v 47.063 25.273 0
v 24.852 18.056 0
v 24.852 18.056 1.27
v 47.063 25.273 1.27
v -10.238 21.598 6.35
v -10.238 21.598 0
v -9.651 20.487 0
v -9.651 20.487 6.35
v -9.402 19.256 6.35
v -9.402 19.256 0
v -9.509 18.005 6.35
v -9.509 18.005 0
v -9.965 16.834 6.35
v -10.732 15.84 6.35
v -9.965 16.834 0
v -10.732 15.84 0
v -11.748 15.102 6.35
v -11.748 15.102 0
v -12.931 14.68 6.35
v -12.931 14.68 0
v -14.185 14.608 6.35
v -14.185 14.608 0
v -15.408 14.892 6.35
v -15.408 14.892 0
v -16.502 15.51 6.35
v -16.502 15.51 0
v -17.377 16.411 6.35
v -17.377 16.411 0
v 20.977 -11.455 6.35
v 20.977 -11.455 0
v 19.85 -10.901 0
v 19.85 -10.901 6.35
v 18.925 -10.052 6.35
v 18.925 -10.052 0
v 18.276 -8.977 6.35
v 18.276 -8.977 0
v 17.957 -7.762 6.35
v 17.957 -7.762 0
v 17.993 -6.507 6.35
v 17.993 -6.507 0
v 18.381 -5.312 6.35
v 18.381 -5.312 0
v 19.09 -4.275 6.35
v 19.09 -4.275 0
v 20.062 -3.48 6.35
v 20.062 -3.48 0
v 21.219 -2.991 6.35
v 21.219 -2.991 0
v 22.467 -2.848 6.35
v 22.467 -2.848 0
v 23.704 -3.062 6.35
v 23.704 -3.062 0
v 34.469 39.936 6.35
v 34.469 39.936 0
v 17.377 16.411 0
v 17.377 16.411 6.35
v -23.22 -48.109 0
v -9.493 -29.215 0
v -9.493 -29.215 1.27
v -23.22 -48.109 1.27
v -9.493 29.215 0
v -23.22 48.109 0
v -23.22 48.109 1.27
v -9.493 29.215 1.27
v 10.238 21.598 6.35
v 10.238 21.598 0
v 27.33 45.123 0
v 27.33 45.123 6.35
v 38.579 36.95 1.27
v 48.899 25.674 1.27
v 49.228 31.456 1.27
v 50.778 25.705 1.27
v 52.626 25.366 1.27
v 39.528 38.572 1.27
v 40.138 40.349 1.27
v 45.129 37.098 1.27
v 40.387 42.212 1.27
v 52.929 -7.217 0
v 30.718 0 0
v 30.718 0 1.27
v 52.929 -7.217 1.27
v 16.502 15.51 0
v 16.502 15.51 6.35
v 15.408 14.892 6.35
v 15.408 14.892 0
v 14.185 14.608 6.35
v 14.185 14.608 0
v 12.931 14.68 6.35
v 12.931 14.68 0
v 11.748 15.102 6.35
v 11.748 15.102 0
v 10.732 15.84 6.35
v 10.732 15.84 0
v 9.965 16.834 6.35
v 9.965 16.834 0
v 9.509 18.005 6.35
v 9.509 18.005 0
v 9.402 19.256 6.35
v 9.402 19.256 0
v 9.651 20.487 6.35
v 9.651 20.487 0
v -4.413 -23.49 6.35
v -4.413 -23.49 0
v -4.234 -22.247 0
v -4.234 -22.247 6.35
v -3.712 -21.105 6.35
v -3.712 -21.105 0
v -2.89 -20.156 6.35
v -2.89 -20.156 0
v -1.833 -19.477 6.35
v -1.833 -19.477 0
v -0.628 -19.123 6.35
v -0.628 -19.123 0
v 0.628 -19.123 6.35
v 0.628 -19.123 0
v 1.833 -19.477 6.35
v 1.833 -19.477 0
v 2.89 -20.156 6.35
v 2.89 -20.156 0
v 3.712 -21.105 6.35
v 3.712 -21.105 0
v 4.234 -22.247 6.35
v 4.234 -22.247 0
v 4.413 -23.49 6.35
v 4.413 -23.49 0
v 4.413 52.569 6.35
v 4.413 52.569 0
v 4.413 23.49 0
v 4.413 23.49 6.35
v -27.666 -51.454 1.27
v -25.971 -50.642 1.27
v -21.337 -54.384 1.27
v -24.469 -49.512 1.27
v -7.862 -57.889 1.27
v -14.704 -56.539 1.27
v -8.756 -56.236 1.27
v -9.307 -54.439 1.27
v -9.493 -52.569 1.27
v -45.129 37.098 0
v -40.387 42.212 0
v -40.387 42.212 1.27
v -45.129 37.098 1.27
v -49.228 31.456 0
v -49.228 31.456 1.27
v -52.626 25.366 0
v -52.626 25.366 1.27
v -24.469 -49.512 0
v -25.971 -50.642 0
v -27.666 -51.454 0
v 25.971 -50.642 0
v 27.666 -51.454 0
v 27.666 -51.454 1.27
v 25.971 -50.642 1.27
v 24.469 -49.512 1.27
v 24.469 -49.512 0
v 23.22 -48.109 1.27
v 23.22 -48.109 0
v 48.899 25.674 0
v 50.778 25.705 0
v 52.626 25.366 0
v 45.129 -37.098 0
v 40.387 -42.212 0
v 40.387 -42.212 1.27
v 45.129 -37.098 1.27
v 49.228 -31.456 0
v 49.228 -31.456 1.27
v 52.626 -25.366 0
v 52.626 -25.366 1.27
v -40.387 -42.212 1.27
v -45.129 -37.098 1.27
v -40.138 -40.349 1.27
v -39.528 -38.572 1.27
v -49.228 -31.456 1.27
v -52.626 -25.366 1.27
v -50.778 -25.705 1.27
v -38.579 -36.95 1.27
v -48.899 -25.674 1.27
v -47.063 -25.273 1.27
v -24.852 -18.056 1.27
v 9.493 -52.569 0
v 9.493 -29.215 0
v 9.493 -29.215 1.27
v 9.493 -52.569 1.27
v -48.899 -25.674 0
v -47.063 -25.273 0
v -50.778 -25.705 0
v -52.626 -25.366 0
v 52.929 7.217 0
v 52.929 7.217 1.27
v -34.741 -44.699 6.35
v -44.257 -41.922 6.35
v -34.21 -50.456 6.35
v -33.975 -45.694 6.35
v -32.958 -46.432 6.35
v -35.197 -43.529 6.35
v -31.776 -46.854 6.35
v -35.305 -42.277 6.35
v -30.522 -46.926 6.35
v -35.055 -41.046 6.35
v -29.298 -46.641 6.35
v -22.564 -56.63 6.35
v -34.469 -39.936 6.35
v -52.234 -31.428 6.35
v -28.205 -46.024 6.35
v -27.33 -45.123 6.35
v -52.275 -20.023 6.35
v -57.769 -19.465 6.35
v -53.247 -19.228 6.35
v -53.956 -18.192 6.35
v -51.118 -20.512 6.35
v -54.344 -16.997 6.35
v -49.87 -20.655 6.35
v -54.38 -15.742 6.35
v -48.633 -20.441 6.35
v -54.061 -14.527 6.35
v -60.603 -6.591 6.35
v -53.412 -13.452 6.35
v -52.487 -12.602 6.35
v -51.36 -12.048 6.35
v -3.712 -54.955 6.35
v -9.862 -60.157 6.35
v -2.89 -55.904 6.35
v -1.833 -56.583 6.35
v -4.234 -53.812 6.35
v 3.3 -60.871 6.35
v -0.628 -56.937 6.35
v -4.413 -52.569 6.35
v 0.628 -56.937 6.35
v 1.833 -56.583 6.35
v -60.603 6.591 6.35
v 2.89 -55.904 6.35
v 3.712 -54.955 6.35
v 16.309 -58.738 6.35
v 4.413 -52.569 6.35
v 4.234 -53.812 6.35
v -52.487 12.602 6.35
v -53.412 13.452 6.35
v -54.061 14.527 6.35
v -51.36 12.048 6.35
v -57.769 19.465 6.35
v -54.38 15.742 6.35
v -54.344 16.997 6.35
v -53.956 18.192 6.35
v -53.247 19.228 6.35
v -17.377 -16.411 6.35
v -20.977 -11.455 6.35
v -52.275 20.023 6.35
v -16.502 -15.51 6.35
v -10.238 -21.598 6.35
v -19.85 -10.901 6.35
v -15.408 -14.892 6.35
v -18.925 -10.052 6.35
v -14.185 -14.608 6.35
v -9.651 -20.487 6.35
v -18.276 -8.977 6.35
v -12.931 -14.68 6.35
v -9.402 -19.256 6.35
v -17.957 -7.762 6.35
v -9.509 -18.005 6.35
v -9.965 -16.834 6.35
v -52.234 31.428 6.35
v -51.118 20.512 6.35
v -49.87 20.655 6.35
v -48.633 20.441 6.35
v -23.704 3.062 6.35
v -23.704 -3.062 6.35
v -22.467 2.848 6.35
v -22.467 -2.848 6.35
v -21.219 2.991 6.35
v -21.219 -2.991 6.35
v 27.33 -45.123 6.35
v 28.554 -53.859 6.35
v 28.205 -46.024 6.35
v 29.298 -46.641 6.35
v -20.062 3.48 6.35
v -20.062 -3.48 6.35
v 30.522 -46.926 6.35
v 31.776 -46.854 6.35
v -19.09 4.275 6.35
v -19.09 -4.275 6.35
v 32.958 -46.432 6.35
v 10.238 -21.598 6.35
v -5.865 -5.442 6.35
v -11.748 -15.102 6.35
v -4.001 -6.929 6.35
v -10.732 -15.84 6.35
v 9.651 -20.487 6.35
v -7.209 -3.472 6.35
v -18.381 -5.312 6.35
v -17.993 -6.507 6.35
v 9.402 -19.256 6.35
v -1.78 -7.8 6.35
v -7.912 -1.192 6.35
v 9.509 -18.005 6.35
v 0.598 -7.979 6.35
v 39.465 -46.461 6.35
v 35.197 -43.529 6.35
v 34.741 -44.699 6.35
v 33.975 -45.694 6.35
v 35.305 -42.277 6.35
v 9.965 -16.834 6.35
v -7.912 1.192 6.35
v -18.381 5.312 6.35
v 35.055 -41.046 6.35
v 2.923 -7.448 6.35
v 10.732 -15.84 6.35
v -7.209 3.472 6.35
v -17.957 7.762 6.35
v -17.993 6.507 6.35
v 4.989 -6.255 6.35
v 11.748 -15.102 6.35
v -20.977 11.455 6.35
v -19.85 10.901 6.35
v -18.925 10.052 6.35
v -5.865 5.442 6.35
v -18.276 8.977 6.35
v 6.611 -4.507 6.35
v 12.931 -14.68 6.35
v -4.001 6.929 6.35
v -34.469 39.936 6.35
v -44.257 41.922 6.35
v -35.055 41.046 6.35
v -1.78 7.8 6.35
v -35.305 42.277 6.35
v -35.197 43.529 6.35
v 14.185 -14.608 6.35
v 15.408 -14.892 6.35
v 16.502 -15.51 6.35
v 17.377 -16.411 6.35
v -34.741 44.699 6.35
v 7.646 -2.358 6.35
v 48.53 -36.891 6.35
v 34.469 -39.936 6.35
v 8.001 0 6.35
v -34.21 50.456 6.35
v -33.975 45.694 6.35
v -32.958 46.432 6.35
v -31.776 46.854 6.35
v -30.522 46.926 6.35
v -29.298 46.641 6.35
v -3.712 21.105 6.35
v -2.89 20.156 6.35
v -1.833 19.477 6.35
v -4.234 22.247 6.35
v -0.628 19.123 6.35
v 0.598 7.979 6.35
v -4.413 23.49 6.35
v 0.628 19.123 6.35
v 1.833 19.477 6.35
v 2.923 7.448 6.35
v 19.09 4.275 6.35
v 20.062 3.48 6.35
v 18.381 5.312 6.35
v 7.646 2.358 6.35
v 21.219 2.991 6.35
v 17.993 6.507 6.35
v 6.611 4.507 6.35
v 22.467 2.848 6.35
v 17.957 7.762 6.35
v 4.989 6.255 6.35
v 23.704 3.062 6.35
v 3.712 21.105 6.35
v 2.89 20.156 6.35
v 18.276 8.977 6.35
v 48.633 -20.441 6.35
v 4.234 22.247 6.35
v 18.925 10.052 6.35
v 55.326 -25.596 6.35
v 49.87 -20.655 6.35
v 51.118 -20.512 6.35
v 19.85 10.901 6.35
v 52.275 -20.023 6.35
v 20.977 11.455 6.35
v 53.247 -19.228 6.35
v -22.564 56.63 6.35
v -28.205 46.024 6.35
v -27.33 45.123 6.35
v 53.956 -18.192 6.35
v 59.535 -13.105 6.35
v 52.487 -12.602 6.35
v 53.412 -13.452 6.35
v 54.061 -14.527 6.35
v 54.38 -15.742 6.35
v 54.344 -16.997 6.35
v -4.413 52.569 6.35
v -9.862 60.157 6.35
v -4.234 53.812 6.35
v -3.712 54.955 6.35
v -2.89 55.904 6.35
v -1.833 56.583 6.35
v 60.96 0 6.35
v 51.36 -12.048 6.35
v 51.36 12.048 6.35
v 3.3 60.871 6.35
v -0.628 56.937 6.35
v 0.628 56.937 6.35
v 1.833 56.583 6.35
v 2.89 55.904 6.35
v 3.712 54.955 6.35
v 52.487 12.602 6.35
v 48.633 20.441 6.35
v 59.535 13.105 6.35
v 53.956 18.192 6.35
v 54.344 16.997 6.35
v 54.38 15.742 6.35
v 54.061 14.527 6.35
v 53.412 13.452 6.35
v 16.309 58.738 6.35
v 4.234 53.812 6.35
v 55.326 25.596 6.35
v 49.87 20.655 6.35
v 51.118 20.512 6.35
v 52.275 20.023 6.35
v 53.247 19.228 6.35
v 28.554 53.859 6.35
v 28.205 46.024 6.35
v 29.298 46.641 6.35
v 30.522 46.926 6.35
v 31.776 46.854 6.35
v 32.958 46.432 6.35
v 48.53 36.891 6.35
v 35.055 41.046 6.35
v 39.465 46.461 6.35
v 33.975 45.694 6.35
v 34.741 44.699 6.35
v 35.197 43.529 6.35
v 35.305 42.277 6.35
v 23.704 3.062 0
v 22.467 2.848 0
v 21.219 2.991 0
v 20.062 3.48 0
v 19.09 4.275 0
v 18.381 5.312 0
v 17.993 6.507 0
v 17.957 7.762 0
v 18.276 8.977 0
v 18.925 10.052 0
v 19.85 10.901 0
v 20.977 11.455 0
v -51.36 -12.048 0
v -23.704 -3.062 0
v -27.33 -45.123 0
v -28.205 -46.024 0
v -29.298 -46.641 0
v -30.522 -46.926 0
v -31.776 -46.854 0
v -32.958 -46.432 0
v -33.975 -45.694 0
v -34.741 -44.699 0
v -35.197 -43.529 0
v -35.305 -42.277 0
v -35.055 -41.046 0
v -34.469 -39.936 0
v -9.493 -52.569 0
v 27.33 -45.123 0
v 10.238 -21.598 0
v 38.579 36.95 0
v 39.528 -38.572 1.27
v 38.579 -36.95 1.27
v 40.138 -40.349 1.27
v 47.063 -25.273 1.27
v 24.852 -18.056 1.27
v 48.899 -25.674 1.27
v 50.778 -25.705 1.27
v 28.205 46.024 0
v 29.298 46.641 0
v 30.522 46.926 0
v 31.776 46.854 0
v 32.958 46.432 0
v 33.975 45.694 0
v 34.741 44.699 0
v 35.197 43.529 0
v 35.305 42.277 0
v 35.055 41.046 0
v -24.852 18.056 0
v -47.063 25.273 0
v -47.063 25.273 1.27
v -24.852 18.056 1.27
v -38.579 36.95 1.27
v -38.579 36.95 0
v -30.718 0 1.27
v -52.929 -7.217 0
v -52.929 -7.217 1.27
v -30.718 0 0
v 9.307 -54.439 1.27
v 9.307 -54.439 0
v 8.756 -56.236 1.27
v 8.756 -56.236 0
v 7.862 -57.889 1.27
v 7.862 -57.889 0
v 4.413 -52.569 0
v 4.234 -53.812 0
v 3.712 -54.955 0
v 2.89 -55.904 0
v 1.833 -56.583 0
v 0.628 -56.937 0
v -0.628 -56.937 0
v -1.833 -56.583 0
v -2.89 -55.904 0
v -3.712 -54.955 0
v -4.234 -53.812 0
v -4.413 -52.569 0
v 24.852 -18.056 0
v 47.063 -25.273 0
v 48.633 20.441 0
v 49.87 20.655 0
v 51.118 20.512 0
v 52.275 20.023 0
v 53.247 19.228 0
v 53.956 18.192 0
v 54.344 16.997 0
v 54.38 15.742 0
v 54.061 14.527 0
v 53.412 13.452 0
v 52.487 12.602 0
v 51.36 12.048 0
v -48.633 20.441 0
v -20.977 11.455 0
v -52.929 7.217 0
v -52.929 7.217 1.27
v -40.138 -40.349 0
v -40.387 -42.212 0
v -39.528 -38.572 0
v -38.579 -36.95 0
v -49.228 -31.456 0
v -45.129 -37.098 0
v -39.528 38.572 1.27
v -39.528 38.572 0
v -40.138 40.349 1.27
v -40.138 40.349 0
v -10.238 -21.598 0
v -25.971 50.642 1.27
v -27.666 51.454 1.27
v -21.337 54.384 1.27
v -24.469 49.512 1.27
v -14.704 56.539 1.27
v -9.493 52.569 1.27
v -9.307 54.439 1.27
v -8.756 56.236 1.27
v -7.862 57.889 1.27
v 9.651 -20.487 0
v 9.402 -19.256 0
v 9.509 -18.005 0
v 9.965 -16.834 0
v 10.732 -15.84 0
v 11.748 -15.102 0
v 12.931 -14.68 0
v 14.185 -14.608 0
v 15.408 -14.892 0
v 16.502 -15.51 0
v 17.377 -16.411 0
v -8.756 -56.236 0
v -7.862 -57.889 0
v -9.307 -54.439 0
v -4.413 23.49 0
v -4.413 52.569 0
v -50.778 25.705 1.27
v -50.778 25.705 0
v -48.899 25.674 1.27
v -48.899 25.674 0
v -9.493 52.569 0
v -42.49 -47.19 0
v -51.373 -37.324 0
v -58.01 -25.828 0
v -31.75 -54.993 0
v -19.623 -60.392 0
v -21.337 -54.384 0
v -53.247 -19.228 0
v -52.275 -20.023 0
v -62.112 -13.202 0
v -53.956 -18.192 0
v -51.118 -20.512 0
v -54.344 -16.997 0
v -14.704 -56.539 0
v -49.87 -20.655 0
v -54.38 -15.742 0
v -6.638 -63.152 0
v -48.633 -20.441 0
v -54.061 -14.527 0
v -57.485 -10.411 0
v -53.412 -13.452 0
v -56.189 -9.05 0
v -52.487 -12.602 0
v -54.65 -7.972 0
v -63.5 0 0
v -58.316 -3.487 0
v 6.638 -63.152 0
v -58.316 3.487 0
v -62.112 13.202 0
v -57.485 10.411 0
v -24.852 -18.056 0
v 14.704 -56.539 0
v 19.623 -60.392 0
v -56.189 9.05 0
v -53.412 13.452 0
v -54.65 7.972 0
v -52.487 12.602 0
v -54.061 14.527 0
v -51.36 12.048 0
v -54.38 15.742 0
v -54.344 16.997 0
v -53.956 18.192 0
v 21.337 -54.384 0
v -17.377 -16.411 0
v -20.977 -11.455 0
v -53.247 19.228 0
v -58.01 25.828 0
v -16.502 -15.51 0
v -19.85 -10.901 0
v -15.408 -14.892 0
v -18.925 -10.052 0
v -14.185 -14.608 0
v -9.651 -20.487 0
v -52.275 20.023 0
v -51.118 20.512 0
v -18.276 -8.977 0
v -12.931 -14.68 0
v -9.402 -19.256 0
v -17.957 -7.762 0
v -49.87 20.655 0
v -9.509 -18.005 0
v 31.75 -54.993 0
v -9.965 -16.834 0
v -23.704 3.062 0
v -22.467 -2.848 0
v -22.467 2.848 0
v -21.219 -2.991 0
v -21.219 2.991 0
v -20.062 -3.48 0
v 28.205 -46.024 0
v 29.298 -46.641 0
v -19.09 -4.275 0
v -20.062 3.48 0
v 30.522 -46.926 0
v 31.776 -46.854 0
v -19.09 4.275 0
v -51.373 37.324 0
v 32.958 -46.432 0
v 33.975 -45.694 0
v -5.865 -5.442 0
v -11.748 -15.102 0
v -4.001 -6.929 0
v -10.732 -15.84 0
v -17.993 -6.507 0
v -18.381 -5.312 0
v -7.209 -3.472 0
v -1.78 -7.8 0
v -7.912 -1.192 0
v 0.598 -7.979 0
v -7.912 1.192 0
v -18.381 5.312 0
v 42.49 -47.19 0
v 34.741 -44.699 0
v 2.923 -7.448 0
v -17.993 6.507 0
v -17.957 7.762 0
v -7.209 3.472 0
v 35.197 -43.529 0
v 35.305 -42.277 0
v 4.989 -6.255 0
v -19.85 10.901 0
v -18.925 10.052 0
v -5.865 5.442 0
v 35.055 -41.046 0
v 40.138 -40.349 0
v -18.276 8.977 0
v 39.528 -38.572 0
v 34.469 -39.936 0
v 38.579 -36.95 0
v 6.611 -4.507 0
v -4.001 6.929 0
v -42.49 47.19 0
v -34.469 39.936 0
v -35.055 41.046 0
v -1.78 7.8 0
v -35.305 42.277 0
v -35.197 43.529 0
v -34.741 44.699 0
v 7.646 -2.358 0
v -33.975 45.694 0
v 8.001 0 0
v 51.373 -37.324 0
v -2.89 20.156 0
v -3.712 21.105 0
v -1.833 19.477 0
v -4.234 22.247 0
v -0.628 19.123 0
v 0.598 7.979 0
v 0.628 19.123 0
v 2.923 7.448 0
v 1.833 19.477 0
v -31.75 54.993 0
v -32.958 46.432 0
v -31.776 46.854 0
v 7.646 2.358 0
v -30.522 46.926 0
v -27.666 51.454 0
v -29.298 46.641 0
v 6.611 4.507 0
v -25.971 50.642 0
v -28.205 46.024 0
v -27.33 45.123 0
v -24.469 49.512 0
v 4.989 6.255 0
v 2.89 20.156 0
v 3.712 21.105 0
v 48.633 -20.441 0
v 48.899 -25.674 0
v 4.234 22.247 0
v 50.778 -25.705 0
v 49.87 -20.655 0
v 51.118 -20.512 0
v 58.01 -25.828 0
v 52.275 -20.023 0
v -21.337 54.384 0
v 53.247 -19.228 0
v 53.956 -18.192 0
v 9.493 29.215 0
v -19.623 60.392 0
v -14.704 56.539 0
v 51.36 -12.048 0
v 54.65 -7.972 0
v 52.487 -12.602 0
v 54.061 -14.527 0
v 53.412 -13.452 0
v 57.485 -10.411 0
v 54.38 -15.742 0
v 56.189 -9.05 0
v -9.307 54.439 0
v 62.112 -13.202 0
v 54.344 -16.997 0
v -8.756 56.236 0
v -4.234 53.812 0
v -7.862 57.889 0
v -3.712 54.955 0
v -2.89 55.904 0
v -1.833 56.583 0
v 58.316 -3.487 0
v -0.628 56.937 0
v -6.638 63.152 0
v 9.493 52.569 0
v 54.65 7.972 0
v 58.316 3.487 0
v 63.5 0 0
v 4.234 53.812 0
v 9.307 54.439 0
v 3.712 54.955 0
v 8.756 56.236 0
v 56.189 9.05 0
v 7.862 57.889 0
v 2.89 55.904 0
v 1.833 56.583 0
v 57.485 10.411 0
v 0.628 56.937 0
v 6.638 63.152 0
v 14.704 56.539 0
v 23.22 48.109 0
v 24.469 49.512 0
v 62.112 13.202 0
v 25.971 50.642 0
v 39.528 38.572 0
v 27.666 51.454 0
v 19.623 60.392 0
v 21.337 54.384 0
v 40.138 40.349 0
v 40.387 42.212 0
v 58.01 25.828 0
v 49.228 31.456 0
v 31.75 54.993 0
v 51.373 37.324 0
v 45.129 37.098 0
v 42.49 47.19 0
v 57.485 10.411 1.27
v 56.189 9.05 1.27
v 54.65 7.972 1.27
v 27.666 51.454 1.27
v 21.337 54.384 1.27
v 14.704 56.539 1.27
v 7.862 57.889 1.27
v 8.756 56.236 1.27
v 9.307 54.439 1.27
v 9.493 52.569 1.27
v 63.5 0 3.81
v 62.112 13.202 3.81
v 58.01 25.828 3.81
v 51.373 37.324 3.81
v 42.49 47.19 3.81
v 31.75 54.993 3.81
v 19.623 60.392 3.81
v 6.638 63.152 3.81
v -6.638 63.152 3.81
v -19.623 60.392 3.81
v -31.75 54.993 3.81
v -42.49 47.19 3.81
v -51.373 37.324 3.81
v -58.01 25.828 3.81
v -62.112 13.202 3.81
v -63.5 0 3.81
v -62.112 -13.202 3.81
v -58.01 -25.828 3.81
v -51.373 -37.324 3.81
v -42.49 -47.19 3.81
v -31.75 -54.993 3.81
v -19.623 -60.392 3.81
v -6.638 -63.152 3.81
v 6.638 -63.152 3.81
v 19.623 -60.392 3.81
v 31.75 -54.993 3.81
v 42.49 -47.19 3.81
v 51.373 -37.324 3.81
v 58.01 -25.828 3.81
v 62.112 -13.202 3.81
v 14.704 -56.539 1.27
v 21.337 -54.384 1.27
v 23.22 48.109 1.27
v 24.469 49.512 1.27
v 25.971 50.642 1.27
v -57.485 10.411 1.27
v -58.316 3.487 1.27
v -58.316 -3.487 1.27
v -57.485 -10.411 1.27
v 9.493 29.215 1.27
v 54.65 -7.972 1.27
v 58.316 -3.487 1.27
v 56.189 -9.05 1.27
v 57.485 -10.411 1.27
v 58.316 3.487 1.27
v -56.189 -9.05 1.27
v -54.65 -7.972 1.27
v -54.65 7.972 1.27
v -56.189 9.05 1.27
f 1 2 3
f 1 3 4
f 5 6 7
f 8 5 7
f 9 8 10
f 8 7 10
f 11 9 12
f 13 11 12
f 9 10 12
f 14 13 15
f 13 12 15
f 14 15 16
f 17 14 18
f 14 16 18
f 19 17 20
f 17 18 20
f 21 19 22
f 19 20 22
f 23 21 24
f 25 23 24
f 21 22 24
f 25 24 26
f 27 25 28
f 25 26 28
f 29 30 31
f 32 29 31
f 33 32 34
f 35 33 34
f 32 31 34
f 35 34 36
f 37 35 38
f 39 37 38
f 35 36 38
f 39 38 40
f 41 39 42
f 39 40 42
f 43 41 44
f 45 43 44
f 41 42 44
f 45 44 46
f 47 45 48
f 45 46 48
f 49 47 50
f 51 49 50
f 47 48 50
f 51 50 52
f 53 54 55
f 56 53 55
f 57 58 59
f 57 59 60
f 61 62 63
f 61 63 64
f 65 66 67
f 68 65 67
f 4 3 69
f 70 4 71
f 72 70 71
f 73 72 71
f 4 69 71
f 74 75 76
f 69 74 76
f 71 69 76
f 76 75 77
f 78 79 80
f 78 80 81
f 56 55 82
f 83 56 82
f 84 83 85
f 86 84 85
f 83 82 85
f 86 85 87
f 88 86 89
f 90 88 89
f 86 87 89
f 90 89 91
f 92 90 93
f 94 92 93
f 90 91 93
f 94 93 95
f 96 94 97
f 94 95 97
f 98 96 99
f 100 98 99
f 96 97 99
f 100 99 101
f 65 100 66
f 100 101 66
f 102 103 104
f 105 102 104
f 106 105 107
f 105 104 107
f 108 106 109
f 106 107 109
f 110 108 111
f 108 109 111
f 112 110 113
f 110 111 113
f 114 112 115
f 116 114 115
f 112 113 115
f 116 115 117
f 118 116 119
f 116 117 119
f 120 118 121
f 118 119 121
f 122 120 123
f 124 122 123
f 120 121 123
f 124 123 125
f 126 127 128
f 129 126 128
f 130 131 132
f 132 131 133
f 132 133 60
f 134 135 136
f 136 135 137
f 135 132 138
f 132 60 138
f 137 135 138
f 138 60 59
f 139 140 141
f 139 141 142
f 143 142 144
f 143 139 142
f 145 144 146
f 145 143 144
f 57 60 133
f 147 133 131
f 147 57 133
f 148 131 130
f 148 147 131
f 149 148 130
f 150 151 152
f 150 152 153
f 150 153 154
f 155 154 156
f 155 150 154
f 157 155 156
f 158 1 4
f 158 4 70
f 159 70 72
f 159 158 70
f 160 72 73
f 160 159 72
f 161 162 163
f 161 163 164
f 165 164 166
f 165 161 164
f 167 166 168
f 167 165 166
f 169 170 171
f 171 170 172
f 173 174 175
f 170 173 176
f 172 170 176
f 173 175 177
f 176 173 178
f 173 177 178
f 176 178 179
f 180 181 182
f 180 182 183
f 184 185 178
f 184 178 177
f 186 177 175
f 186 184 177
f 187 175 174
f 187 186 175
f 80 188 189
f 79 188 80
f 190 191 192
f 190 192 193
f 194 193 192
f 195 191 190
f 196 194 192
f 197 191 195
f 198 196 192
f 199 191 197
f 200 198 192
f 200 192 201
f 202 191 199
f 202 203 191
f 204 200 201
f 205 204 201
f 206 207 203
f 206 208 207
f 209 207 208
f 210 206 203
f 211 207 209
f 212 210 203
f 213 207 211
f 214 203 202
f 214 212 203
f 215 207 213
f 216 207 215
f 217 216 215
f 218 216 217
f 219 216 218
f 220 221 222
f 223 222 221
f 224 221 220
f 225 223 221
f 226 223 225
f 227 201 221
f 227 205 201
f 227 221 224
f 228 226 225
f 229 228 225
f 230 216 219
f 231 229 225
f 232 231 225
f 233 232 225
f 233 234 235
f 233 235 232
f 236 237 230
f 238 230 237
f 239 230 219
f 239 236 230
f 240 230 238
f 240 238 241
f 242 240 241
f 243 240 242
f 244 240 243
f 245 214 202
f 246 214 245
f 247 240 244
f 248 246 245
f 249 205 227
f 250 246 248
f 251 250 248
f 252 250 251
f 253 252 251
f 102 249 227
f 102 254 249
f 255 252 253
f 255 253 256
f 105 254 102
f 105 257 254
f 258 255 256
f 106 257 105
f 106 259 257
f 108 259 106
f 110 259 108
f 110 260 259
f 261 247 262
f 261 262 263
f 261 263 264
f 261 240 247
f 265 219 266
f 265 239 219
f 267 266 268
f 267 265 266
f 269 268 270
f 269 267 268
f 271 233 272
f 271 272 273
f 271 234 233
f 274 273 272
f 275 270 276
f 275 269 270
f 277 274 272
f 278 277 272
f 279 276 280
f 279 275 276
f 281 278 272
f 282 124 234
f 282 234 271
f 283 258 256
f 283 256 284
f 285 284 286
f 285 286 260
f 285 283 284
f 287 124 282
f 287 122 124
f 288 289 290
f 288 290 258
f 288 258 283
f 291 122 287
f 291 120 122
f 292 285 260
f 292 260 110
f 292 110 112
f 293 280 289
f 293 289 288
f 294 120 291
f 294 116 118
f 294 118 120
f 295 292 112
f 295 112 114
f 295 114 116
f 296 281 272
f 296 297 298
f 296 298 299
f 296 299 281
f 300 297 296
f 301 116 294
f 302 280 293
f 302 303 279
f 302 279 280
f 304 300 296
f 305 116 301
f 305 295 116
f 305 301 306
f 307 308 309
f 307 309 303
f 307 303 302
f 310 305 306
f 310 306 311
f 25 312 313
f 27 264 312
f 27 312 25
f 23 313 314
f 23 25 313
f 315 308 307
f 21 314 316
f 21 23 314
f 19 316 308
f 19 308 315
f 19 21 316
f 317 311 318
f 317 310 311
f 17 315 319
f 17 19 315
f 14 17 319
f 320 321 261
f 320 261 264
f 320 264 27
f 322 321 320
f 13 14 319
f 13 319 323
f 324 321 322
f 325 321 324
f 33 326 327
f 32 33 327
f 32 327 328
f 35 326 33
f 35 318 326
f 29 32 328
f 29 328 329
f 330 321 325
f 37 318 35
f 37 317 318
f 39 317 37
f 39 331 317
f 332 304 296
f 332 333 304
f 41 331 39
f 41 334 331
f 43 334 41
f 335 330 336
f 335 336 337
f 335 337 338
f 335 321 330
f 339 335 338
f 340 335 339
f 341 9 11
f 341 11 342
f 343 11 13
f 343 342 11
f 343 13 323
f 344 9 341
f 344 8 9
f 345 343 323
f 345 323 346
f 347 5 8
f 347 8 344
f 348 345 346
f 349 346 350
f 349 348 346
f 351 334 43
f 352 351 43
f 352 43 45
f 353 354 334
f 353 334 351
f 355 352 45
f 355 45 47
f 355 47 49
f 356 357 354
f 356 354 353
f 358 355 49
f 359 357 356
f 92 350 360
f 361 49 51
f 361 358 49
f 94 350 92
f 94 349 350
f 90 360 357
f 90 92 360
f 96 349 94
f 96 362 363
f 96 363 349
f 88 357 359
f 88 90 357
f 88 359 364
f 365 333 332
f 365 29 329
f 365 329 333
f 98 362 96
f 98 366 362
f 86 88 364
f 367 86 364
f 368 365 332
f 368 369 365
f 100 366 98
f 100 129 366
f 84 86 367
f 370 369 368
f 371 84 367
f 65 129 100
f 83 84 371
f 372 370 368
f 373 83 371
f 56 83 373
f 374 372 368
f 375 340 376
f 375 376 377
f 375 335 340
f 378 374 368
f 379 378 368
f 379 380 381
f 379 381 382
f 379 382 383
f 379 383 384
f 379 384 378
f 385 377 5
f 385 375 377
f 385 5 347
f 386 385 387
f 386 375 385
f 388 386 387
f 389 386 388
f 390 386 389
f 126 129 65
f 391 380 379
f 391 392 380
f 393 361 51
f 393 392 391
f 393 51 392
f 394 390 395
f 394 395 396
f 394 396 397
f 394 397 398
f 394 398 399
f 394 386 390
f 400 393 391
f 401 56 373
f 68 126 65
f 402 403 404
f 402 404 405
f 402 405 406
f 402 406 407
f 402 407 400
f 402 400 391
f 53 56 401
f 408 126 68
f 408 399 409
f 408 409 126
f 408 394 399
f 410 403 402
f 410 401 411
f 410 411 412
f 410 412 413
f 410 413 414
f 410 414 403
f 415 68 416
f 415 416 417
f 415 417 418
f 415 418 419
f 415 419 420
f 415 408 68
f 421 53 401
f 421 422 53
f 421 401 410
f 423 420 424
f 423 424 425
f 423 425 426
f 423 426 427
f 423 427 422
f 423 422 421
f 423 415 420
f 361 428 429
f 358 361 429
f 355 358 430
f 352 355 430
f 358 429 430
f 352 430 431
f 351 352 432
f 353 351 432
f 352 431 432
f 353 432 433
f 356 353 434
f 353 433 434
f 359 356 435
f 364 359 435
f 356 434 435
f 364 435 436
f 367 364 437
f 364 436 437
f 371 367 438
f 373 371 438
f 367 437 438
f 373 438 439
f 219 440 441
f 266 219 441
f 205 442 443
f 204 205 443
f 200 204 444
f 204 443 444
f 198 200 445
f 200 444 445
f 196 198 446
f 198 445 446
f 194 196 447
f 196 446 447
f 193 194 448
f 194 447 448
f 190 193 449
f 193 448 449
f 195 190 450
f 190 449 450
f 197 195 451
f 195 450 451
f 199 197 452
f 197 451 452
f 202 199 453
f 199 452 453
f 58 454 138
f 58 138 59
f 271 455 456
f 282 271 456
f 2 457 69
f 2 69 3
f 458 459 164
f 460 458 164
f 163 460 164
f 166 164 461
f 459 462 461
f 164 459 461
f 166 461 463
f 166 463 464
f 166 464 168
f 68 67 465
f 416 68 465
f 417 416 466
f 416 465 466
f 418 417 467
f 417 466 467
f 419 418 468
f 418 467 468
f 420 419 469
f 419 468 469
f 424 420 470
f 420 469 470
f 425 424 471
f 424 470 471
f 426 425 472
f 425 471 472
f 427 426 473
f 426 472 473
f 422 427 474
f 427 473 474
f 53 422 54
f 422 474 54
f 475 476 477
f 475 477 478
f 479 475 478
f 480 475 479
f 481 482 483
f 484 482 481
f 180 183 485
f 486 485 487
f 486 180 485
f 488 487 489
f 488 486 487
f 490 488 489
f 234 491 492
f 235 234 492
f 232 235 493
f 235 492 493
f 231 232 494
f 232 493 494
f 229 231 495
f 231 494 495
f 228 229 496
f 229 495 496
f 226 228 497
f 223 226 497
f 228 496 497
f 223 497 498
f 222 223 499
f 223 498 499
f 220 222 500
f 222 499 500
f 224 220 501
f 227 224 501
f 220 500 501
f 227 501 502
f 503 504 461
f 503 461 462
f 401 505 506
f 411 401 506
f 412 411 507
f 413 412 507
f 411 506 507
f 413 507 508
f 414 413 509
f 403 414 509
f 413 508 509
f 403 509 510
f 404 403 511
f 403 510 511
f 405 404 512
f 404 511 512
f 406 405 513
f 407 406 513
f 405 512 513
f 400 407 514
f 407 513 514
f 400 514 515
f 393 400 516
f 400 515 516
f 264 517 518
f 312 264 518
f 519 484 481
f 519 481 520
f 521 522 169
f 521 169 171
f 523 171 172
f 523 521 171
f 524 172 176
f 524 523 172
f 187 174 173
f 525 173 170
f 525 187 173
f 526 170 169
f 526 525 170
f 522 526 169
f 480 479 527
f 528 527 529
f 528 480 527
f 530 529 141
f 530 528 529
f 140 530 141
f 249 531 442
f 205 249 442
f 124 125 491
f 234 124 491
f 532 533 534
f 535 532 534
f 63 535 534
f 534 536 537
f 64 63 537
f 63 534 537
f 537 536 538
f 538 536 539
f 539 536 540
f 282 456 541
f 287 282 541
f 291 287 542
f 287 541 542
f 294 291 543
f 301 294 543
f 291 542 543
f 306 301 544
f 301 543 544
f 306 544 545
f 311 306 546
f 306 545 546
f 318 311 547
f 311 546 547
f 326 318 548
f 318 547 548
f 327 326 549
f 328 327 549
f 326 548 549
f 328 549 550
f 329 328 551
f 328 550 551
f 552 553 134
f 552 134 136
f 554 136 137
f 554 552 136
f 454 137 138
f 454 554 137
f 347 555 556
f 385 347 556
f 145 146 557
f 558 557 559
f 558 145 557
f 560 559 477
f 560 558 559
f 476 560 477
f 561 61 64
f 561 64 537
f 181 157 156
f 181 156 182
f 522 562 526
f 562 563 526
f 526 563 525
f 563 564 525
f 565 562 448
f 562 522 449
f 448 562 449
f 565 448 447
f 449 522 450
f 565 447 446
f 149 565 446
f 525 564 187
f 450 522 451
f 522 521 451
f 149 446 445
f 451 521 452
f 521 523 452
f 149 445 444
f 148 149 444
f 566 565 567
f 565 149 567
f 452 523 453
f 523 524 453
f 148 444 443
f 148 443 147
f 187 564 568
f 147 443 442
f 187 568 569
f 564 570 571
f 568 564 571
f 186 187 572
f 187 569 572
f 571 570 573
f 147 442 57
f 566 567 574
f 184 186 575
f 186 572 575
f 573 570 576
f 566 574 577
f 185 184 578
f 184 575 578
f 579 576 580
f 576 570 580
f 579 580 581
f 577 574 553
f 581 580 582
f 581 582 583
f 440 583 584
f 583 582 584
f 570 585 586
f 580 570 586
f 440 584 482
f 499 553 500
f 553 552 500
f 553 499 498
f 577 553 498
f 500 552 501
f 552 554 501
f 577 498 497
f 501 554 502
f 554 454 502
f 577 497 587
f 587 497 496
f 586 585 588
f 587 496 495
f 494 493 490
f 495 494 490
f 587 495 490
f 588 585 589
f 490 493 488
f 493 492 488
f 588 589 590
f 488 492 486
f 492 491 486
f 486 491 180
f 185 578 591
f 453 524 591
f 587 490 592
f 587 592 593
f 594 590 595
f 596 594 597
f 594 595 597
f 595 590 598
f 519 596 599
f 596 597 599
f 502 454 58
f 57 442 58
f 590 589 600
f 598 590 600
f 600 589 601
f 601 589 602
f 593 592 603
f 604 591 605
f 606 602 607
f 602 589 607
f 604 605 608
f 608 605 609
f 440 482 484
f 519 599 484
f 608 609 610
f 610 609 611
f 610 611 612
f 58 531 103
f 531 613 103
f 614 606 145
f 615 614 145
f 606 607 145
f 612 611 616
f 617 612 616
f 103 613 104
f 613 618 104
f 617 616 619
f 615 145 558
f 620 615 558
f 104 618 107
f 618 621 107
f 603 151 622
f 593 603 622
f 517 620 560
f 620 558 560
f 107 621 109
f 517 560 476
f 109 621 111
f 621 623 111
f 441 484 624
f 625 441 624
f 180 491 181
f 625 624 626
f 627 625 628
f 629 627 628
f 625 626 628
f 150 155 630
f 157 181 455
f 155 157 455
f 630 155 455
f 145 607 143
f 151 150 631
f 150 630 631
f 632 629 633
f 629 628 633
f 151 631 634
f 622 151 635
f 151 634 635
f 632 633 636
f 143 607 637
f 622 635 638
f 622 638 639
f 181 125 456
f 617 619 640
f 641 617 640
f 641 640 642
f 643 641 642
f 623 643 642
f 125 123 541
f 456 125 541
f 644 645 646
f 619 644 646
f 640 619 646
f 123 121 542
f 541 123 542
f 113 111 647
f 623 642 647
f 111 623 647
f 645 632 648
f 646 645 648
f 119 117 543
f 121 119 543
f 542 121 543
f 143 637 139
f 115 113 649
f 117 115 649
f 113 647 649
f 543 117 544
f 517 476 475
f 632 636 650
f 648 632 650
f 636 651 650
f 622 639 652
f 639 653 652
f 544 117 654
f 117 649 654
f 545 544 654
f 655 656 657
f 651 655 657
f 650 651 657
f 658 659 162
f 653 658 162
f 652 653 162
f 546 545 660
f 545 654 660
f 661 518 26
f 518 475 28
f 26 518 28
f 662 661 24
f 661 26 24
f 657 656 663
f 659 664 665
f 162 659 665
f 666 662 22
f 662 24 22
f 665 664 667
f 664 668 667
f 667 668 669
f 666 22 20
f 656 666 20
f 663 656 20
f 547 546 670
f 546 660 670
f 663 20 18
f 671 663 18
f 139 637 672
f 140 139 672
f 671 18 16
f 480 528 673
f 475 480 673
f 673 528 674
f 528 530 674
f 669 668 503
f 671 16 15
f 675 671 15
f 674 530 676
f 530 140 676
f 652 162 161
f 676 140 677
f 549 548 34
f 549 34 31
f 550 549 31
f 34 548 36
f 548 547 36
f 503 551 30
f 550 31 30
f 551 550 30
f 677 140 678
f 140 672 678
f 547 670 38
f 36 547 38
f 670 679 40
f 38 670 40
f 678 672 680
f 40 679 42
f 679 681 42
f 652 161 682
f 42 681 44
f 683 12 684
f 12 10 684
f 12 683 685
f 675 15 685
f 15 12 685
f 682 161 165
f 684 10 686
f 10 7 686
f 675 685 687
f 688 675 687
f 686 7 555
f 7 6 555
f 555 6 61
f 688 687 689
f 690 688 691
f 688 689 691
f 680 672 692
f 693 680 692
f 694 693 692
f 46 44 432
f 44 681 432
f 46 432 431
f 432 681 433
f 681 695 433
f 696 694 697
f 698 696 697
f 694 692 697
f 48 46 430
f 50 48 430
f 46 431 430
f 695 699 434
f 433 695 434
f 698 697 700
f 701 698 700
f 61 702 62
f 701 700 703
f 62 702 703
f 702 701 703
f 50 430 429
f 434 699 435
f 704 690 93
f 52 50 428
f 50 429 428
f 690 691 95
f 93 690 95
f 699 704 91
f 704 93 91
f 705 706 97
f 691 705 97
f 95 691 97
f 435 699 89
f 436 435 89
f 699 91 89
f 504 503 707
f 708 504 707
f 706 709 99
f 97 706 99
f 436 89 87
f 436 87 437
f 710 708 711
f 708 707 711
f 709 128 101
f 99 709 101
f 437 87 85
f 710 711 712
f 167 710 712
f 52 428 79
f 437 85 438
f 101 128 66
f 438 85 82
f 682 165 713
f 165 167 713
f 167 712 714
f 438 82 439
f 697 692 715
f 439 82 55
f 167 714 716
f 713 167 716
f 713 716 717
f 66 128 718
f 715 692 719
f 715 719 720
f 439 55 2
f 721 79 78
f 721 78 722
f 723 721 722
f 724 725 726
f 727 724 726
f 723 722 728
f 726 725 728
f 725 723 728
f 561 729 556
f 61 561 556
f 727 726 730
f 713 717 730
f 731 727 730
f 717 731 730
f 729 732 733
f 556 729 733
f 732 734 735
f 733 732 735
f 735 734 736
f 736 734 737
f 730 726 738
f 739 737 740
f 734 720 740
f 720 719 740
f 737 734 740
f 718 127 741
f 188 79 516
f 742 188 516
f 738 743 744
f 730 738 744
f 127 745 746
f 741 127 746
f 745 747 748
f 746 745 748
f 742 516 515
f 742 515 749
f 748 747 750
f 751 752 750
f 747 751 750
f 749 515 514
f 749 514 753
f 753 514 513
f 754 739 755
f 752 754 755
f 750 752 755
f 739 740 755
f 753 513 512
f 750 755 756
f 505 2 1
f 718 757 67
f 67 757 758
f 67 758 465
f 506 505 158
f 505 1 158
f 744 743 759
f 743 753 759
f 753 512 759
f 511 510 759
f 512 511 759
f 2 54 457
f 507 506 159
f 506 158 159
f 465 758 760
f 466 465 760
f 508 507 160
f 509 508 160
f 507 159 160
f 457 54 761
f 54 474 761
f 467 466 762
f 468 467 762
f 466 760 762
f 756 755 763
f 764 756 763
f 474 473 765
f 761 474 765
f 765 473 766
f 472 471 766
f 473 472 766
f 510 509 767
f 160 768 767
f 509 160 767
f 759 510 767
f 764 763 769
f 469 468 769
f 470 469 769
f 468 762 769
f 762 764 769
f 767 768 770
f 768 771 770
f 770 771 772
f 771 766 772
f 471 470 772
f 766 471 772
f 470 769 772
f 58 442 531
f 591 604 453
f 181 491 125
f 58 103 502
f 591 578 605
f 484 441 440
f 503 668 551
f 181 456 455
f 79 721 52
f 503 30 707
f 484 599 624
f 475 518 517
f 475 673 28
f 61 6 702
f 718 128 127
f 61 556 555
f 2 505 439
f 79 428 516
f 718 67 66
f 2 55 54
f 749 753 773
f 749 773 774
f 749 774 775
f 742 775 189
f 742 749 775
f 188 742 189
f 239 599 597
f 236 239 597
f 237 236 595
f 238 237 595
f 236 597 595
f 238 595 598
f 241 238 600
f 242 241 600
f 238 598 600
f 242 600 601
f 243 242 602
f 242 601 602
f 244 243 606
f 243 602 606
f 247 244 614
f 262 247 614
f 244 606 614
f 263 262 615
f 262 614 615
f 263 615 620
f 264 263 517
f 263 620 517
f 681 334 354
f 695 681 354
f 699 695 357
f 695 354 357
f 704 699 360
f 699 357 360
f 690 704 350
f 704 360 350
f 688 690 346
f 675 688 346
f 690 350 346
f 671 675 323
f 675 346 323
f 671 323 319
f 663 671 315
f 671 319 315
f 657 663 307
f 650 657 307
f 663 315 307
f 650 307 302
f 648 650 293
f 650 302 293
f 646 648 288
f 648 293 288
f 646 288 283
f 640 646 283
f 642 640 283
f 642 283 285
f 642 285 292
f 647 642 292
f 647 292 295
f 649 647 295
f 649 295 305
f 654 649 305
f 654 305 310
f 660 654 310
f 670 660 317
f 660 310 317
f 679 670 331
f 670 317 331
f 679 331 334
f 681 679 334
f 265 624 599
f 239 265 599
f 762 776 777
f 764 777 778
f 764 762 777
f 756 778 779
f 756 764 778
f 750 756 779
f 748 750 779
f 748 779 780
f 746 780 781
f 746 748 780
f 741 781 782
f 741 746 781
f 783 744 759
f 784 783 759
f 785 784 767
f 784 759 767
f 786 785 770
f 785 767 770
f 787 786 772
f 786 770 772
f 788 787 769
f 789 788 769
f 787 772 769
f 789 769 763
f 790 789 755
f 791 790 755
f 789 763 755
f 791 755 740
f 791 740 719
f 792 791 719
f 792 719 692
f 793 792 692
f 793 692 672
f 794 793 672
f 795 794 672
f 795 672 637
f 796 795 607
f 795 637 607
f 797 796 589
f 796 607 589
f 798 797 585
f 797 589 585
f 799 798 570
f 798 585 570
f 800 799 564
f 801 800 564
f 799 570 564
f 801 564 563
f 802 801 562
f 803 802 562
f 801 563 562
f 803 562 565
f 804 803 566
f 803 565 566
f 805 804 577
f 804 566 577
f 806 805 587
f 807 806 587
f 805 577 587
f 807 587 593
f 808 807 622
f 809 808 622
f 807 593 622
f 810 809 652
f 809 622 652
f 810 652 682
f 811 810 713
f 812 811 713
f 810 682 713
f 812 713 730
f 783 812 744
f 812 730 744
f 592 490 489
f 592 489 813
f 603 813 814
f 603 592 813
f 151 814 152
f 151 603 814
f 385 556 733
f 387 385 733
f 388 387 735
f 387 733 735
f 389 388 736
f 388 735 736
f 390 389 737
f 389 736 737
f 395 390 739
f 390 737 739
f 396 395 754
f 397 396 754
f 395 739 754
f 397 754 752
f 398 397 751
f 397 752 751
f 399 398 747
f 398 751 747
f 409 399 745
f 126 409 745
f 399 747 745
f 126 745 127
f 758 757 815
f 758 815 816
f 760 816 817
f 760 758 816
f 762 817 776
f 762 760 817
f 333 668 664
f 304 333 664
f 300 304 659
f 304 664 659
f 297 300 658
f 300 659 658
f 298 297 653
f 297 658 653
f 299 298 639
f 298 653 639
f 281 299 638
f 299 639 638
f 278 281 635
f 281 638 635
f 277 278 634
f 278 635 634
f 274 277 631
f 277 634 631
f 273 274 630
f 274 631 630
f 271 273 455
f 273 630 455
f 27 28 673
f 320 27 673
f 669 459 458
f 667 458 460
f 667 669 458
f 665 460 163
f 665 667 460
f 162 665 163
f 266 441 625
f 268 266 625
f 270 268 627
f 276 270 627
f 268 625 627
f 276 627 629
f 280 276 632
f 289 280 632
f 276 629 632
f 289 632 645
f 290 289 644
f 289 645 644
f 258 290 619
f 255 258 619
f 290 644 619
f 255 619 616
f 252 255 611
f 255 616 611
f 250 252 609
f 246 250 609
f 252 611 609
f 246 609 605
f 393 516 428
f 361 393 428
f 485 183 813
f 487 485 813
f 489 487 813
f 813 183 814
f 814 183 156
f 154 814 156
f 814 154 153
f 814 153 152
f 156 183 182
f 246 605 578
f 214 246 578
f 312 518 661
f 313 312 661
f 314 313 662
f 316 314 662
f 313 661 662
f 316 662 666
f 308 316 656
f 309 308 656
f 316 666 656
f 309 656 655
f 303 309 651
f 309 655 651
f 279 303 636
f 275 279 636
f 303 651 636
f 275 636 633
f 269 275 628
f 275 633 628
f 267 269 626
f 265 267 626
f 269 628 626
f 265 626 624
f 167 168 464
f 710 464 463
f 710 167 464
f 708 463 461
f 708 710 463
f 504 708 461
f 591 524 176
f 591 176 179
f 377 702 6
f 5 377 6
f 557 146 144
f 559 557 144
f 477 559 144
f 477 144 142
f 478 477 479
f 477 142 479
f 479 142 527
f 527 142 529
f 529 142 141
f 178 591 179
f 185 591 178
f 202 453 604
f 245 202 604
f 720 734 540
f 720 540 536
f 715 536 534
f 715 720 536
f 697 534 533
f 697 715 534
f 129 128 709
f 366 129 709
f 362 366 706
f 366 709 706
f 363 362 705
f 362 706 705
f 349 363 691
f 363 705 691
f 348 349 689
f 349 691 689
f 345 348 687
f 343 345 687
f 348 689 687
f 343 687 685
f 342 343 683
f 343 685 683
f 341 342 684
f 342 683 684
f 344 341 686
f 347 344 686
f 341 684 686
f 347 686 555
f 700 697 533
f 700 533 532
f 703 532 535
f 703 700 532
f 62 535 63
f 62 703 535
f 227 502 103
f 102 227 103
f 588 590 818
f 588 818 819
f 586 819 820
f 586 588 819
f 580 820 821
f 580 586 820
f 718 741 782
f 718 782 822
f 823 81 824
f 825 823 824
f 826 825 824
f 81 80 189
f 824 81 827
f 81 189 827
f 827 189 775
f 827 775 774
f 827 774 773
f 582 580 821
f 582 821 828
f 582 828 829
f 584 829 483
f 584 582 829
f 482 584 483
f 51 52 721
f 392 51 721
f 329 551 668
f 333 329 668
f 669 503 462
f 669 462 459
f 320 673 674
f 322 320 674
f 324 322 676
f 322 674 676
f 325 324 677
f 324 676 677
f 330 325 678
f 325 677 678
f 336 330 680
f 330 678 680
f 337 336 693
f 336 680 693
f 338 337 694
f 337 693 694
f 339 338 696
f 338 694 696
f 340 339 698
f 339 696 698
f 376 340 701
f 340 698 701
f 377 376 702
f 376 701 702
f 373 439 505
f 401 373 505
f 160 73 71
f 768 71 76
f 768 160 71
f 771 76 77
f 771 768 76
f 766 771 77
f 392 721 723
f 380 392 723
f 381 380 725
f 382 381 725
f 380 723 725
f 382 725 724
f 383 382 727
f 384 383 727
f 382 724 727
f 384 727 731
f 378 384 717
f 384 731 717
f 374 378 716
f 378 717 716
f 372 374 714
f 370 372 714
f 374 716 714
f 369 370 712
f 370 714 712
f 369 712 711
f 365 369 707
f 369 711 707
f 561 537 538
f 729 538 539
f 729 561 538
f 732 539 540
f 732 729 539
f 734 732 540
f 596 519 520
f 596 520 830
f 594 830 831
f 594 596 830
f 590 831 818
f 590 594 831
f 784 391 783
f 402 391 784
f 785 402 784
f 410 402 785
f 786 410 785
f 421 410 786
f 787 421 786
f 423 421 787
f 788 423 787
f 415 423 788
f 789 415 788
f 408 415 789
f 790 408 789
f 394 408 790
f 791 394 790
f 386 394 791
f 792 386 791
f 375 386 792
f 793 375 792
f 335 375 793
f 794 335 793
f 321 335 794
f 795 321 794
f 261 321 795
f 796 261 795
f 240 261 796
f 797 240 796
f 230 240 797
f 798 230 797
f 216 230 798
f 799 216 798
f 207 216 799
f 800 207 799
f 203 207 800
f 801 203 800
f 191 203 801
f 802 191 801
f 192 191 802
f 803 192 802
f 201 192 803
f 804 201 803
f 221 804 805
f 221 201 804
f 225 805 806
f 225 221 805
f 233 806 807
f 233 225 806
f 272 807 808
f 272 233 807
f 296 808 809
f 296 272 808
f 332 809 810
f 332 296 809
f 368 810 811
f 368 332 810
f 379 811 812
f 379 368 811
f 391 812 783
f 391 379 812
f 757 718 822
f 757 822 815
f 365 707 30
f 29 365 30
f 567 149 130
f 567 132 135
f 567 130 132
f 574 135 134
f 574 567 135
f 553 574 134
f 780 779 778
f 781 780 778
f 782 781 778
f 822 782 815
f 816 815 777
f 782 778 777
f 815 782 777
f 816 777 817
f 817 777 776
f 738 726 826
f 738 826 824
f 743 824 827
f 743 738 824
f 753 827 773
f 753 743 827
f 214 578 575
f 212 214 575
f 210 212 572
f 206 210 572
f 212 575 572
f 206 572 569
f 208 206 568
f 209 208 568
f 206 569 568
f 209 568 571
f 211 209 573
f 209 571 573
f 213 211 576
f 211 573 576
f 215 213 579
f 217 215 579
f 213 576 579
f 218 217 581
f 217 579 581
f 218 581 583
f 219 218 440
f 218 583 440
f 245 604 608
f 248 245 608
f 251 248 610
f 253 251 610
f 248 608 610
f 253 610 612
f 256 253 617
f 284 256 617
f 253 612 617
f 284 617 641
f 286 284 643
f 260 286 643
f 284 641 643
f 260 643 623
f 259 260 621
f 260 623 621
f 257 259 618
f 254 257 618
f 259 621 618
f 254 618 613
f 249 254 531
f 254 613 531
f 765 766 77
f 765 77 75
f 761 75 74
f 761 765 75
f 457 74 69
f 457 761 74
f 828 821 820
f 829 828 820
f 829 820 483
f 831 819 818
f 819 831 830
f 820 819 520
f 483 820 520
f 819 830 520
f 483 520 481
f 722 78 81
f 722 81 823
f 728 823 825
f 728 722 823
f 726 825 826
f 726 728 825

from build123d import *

# Parameters (mm, degrees)
F0_R     = 63.5
F0_R_2   = 12.7
F1_DEPTH = 6.35
F2_T     = 5.08
F3_SIZE  = 2.54
F4_R     = 12.7
F4_R_2   = 8.001
F5_DEPTH = 6.35


# Not quite as in the source:
# - a shell that OpenCascade refuses in one call is made with other operations: the cavity is built on its own and cut out


with BuildPart() as f1:
    # F0 (on Top) → F1 (new body)
    with BuildSketch(Plane.XY):
        Circle(F0_R)
        with BuildLine():
            ThreePointArc((4.4125195695, -52.5690356897), (0, -56.9815552592), (-4.4125195695, -52.5690356897))
            Line((-4.4125195695, -52.5690356897), (-4.4125195695, -23.4904065728))
            ThreePointArc((-4.4125195695, -23.4904065728), (0, -19.0778870033), (4.4125195695, -23.4904065728))
            Line((4.4125195695, -23.4904065728), (4.4125195695, -52.5690356897))
        make_face(mode=Mode.SUBTRACT)
        with BuildLine():
            ThreePointArc((-48.6325804131, -20.4412808959), (-54.1926794379, -17.608268941), (-51.359667483, -12.0481699162))
            Line((-51.359667483, -12.0481699162), (-23.7042477765, -3.0623793459))
            ThreePointArc((-23.7042477765, -3.0623793459), (-18.1441487516, -5.8953913008), (-20.9771607065, -11.4554903256))
            Line((-20.9771607065, -11.4554903256), (-48.6325804131, -20.4412808959))
        make_face(mode=Mode.SUBTRACT)
        with BuildLine():
            ThreePointArc((-27.3295005859, -45.1228571793), (-33.4929178341, -46.0990465706), (-34.4691072254, -39.9356293225))
            Line((-34.4691072254, -39.9356293225), (-17.3771178736, -16.4105241938))
            ThreePointArc((-17.3771178736, -16.4105241938), (-11.2137006254, -15.4343348024), (-10.2375112341, -21.5977520506))
            Line((-10.2375112341, -21.5977520506), (-27.3295005859, -45.1228571793))
        make_face(mode=Mode.SUBTRACT)
        with BuildLine():
            ThreePointArc((34.4691072254, -39.9356293225), (33.4929178341, -46.0990465706), (27.3295005859, -45.1228571793))
            Line((27.3295005859, -45.1228571793), (10.2375112341, -21.5977520506))
            ThreePointArc((10.2375112341, -21.5977520506), (11.2137006254, -15.4343348024), (17.3771178736, -16.4105241938))
            Line((17.3771178736, -16.4105241938), (34.4691072254, -39.9356293225))
        make_face(mode=Mode.SUBTRACT)
        with BuildLine():
            ThreePointArc((51.359667483, -12.0481699162), (54.1926794379, -17.608268941), (48.6325804131, -20.4412808959))
            Line((48.6325804131, -20.4412808959), (20.9771607065, -11.4554903256))
            ThreePointArc((20.9771607065, -11.4554903256), (18.1441487516, -5.8953913008), (23.7042477765, -3.0623793459))
            Line((23.7042477765, -3.0623793459), (51.359667483, -12.0481699162))
        make_face(mode=Mode.SUBTRACT)
        with BuildLine():
            ThreePointArc((-51.359667483, 12.0481699162), (-54.1926794379, 17.608268941), (-48.6325804131, 20.4412808959))
            Line((-48.6325804131, 20.4412808959), (-20.9771607065, 11.4554903256))
            ThreePointArc((-20.9771607065, 11.4554903256), (-18.1441487516, 5.8953913008), (-23.7042477765, 3.0623793459))
            Line((-23.7042477765, 3.0623793459), (-51.359667483, 12.0481699162))
        make_face(mode=Mode.SUBTRACT)
        with BuildLine():
            ThreePointArc((-34.4691072254, 39.9356293225), (-33.4929178341, 46.0990465706), (-27.3295005859, 45.1228571793))
            Line((-27.3295005859, 45.1228571793), (-10.2375112341, 21.5977520506))
            ThreePointArc((-10.2375112341, 21.5977520506), (-11.2137006254, 15.4343348024), (-17.3771178736, 16.4105241938))
            Line((-17.3771178736, 16.4105241938), (-34.4691072254, 39.9356293225))
        make_face(mode=Mode.SUBTRACT)
        Circle(F0_R_2, mode=Mode.SUBTRACT)
        with BuildLine():
            ThreePointArc((27.3295005859, 45.1228571793), (33.4929178341, 46.0990465706), (34.4691072254, 39.9356293225))
            Line((34.4691072254, 39.9356293225), (17.3771178736, 16.4105241938))
            ThreePointArc((17.3771178736, 16.4105241938), (11.2137006254, 15.4343348024), (10.2375112341, 21.5977520506))
            Line((10.2375112341, 21.5977520506), (27.3295005859, 45.1228571793))
        make_face(mode=Mode.SUBTRACT)
        with BuildLine():
            ThreePointArc((48.6325804131, 20.4412808959), (54.1926794379, 17.608268941), (51.359667483, 12.0481699162))
            Line((51.359667483, 12.0481699162), (23.7042477765, 3.0623793459))
            ThreePointArc((23.7042477765, 3.0623793459), (18.1441487516, 5.8953913008), (20.9771607065, 11.4554903256))
            Line((20.9771607065, 11.4554903256), (48.6325804131, 20.4412808959))
        make_face(mode=Mode.SUBTRACT)
        with BuildLine():
            Line((4.4125195695, 52.5690356897), (4.4125195695, 23.4904065728))
            ThreePointArc((4.4125195695, 23.4904065728), (0, 19.0778870033), (-4.4125195695, 23.4904065728))
            Line((-4.4125195695, 23.4904065728), (-4.4125195695, 52.5690356897))
            ThreePointArc((-4.4125195695, 52.5690356897), (0, 56.9815552592), (4.4125195695, 52.5690356897))
        make_face(mode=Mode.SUBTRACT)
    extrude(amount=F1_DEPTH)

    # F2: shell of thickness 5.08, made by hand


with BuildPart() as f2_core1:
    # F2_t2: copy of F1
    add(f1.part)

    # the walls: a layer under each face that stays
    f2_faces = [f2_core1.faces().sort_by_distance(p)[0] for p in [
        (-63.5, 0, 3.175),
        (4.4125195695, -38.0297211313, 3.175),
        (0, -56.9815552592, 3.175),
        (-4.4125195695, -38.0297211313, 3.175),
        (0, -19.0778870033, 3.175),
        (-18.1441487516, -5.8953913008, 3.175),
        (-34.8048705598, -15.9483856108, 3.175),
        (-54.1926794379, -17.608268941, 3.175),
        (-37.5319576298, -7.555274631, 3.175),
        (-18.78350591, -33.3603046149, 3.175),
        (-33.4929178341, -46.0990465706, 3.175),
        (-25.9231125495, -28.1730767581, 3.175),
        (-11.2137006254, -15.4343348024, 3.175),
        (11.2137006254, -15.4343348024, 3.175),
        (25.9231125495, -28.1730767581, 3.175),
        (33.4929178341, -46.0990465706, 3.175),
        (18.78350591, -33.3603046149, 3.175),
        (18.1441487516, -5.8953913008, 3.175),
        (37.5319576298, -7.555274631, 3.175),
        (54.1926794379, -17.608268941, 3.175),
        (34.8048705598, -15.9483856108, 3.175),
        (-37.5319576298, 7.555274631, 3.175),
        (-54.1926794379, 17.608268941, 3.175),
        (-34.8048705598, 15.9483856108, 3.175),
        (-18.1441487516, 5.8953913008, 3.175),
        (-25.9231125495, 28.1730767581, 3.175),
        (-33.4929178341, 46.0990465706, 3.175),
        (-18.78350591, 33.3603046149, 3.175),
        (-11.2137006254, 15.4343348024, 3.175),
        (-12.7, 0, 3.175),
        (11.2137006254, 15.4343348024, 3.175),
        (18.78350591, 33.3603046149, 3.175),
        (33.4929178341, 46.0990465706, 3.175),
        (25.9231125495, 28.1730767581, 3.175),
        (18.1441487516, 5.8953913008, 3.175),
        (34.8048705598, 15.9483856108, 3.175),
        (54.1926794379, 17.608268941, 3.175),
        (37.5319576298, 7.555274631, 3.175),
        (0, 19.0778870033, 3.175),
        (-4.4125195695, 38.0297211313, 3.175),
        (0, 56.9815552592, 3.175),
        (4.4125195695, 38.0297211313, 3.175),
        (-42.3333333333, -42.3333333333, 6.35),
    ]]
    thicken(f2_faces, amount=-F2_T, mode=Mode.SUBTRACT)


with BuildPart() as f1_1:
    add(f1.part)

    # what is left inside the walls is the cavity
    f2_cavity = [f2_core1.part.solids().sort_by_distance(p)[0] for p in [
        (17.763773, -48.3307, 1.2192),
        (38.738777, -34.159737, 1.2192),
        (44.569219, -3.470458, 1.2192),
        (38.738777, 26.107791, 1.2192),
        (12.812871, 48.3307, 1.2192),
        (-22.714676, 48.3307, 0.0508),
        (-38.738777, 26.107791, 0.0508),
        (-44.569219, -3.470458, 0.0508),
        (-38.738777, -34.159737, 1.2192),
        (-17.763773, -48.3307, 0.0508),
    ]]
    add(f2_cavity, mode=Mode.SUBTRACT)

    # F3
    f3_edges = [f1_1.edges().sort_by_distance(p)[0] for p in [
        (-63.5, 0, 6.35),
    ]]
    chamfer(f3_edges, length=F3_SIZE)

    # F4 (on face) → F5 (join)
    with BuildSketch(Plane.XY.offset(6.35)):
        Circle(F4_R)
        Circle(F4_R_2, mode=Mode.SUBTRACT)
    extrude(amount=-F5_DEPTH)


solid = f1_1.part
